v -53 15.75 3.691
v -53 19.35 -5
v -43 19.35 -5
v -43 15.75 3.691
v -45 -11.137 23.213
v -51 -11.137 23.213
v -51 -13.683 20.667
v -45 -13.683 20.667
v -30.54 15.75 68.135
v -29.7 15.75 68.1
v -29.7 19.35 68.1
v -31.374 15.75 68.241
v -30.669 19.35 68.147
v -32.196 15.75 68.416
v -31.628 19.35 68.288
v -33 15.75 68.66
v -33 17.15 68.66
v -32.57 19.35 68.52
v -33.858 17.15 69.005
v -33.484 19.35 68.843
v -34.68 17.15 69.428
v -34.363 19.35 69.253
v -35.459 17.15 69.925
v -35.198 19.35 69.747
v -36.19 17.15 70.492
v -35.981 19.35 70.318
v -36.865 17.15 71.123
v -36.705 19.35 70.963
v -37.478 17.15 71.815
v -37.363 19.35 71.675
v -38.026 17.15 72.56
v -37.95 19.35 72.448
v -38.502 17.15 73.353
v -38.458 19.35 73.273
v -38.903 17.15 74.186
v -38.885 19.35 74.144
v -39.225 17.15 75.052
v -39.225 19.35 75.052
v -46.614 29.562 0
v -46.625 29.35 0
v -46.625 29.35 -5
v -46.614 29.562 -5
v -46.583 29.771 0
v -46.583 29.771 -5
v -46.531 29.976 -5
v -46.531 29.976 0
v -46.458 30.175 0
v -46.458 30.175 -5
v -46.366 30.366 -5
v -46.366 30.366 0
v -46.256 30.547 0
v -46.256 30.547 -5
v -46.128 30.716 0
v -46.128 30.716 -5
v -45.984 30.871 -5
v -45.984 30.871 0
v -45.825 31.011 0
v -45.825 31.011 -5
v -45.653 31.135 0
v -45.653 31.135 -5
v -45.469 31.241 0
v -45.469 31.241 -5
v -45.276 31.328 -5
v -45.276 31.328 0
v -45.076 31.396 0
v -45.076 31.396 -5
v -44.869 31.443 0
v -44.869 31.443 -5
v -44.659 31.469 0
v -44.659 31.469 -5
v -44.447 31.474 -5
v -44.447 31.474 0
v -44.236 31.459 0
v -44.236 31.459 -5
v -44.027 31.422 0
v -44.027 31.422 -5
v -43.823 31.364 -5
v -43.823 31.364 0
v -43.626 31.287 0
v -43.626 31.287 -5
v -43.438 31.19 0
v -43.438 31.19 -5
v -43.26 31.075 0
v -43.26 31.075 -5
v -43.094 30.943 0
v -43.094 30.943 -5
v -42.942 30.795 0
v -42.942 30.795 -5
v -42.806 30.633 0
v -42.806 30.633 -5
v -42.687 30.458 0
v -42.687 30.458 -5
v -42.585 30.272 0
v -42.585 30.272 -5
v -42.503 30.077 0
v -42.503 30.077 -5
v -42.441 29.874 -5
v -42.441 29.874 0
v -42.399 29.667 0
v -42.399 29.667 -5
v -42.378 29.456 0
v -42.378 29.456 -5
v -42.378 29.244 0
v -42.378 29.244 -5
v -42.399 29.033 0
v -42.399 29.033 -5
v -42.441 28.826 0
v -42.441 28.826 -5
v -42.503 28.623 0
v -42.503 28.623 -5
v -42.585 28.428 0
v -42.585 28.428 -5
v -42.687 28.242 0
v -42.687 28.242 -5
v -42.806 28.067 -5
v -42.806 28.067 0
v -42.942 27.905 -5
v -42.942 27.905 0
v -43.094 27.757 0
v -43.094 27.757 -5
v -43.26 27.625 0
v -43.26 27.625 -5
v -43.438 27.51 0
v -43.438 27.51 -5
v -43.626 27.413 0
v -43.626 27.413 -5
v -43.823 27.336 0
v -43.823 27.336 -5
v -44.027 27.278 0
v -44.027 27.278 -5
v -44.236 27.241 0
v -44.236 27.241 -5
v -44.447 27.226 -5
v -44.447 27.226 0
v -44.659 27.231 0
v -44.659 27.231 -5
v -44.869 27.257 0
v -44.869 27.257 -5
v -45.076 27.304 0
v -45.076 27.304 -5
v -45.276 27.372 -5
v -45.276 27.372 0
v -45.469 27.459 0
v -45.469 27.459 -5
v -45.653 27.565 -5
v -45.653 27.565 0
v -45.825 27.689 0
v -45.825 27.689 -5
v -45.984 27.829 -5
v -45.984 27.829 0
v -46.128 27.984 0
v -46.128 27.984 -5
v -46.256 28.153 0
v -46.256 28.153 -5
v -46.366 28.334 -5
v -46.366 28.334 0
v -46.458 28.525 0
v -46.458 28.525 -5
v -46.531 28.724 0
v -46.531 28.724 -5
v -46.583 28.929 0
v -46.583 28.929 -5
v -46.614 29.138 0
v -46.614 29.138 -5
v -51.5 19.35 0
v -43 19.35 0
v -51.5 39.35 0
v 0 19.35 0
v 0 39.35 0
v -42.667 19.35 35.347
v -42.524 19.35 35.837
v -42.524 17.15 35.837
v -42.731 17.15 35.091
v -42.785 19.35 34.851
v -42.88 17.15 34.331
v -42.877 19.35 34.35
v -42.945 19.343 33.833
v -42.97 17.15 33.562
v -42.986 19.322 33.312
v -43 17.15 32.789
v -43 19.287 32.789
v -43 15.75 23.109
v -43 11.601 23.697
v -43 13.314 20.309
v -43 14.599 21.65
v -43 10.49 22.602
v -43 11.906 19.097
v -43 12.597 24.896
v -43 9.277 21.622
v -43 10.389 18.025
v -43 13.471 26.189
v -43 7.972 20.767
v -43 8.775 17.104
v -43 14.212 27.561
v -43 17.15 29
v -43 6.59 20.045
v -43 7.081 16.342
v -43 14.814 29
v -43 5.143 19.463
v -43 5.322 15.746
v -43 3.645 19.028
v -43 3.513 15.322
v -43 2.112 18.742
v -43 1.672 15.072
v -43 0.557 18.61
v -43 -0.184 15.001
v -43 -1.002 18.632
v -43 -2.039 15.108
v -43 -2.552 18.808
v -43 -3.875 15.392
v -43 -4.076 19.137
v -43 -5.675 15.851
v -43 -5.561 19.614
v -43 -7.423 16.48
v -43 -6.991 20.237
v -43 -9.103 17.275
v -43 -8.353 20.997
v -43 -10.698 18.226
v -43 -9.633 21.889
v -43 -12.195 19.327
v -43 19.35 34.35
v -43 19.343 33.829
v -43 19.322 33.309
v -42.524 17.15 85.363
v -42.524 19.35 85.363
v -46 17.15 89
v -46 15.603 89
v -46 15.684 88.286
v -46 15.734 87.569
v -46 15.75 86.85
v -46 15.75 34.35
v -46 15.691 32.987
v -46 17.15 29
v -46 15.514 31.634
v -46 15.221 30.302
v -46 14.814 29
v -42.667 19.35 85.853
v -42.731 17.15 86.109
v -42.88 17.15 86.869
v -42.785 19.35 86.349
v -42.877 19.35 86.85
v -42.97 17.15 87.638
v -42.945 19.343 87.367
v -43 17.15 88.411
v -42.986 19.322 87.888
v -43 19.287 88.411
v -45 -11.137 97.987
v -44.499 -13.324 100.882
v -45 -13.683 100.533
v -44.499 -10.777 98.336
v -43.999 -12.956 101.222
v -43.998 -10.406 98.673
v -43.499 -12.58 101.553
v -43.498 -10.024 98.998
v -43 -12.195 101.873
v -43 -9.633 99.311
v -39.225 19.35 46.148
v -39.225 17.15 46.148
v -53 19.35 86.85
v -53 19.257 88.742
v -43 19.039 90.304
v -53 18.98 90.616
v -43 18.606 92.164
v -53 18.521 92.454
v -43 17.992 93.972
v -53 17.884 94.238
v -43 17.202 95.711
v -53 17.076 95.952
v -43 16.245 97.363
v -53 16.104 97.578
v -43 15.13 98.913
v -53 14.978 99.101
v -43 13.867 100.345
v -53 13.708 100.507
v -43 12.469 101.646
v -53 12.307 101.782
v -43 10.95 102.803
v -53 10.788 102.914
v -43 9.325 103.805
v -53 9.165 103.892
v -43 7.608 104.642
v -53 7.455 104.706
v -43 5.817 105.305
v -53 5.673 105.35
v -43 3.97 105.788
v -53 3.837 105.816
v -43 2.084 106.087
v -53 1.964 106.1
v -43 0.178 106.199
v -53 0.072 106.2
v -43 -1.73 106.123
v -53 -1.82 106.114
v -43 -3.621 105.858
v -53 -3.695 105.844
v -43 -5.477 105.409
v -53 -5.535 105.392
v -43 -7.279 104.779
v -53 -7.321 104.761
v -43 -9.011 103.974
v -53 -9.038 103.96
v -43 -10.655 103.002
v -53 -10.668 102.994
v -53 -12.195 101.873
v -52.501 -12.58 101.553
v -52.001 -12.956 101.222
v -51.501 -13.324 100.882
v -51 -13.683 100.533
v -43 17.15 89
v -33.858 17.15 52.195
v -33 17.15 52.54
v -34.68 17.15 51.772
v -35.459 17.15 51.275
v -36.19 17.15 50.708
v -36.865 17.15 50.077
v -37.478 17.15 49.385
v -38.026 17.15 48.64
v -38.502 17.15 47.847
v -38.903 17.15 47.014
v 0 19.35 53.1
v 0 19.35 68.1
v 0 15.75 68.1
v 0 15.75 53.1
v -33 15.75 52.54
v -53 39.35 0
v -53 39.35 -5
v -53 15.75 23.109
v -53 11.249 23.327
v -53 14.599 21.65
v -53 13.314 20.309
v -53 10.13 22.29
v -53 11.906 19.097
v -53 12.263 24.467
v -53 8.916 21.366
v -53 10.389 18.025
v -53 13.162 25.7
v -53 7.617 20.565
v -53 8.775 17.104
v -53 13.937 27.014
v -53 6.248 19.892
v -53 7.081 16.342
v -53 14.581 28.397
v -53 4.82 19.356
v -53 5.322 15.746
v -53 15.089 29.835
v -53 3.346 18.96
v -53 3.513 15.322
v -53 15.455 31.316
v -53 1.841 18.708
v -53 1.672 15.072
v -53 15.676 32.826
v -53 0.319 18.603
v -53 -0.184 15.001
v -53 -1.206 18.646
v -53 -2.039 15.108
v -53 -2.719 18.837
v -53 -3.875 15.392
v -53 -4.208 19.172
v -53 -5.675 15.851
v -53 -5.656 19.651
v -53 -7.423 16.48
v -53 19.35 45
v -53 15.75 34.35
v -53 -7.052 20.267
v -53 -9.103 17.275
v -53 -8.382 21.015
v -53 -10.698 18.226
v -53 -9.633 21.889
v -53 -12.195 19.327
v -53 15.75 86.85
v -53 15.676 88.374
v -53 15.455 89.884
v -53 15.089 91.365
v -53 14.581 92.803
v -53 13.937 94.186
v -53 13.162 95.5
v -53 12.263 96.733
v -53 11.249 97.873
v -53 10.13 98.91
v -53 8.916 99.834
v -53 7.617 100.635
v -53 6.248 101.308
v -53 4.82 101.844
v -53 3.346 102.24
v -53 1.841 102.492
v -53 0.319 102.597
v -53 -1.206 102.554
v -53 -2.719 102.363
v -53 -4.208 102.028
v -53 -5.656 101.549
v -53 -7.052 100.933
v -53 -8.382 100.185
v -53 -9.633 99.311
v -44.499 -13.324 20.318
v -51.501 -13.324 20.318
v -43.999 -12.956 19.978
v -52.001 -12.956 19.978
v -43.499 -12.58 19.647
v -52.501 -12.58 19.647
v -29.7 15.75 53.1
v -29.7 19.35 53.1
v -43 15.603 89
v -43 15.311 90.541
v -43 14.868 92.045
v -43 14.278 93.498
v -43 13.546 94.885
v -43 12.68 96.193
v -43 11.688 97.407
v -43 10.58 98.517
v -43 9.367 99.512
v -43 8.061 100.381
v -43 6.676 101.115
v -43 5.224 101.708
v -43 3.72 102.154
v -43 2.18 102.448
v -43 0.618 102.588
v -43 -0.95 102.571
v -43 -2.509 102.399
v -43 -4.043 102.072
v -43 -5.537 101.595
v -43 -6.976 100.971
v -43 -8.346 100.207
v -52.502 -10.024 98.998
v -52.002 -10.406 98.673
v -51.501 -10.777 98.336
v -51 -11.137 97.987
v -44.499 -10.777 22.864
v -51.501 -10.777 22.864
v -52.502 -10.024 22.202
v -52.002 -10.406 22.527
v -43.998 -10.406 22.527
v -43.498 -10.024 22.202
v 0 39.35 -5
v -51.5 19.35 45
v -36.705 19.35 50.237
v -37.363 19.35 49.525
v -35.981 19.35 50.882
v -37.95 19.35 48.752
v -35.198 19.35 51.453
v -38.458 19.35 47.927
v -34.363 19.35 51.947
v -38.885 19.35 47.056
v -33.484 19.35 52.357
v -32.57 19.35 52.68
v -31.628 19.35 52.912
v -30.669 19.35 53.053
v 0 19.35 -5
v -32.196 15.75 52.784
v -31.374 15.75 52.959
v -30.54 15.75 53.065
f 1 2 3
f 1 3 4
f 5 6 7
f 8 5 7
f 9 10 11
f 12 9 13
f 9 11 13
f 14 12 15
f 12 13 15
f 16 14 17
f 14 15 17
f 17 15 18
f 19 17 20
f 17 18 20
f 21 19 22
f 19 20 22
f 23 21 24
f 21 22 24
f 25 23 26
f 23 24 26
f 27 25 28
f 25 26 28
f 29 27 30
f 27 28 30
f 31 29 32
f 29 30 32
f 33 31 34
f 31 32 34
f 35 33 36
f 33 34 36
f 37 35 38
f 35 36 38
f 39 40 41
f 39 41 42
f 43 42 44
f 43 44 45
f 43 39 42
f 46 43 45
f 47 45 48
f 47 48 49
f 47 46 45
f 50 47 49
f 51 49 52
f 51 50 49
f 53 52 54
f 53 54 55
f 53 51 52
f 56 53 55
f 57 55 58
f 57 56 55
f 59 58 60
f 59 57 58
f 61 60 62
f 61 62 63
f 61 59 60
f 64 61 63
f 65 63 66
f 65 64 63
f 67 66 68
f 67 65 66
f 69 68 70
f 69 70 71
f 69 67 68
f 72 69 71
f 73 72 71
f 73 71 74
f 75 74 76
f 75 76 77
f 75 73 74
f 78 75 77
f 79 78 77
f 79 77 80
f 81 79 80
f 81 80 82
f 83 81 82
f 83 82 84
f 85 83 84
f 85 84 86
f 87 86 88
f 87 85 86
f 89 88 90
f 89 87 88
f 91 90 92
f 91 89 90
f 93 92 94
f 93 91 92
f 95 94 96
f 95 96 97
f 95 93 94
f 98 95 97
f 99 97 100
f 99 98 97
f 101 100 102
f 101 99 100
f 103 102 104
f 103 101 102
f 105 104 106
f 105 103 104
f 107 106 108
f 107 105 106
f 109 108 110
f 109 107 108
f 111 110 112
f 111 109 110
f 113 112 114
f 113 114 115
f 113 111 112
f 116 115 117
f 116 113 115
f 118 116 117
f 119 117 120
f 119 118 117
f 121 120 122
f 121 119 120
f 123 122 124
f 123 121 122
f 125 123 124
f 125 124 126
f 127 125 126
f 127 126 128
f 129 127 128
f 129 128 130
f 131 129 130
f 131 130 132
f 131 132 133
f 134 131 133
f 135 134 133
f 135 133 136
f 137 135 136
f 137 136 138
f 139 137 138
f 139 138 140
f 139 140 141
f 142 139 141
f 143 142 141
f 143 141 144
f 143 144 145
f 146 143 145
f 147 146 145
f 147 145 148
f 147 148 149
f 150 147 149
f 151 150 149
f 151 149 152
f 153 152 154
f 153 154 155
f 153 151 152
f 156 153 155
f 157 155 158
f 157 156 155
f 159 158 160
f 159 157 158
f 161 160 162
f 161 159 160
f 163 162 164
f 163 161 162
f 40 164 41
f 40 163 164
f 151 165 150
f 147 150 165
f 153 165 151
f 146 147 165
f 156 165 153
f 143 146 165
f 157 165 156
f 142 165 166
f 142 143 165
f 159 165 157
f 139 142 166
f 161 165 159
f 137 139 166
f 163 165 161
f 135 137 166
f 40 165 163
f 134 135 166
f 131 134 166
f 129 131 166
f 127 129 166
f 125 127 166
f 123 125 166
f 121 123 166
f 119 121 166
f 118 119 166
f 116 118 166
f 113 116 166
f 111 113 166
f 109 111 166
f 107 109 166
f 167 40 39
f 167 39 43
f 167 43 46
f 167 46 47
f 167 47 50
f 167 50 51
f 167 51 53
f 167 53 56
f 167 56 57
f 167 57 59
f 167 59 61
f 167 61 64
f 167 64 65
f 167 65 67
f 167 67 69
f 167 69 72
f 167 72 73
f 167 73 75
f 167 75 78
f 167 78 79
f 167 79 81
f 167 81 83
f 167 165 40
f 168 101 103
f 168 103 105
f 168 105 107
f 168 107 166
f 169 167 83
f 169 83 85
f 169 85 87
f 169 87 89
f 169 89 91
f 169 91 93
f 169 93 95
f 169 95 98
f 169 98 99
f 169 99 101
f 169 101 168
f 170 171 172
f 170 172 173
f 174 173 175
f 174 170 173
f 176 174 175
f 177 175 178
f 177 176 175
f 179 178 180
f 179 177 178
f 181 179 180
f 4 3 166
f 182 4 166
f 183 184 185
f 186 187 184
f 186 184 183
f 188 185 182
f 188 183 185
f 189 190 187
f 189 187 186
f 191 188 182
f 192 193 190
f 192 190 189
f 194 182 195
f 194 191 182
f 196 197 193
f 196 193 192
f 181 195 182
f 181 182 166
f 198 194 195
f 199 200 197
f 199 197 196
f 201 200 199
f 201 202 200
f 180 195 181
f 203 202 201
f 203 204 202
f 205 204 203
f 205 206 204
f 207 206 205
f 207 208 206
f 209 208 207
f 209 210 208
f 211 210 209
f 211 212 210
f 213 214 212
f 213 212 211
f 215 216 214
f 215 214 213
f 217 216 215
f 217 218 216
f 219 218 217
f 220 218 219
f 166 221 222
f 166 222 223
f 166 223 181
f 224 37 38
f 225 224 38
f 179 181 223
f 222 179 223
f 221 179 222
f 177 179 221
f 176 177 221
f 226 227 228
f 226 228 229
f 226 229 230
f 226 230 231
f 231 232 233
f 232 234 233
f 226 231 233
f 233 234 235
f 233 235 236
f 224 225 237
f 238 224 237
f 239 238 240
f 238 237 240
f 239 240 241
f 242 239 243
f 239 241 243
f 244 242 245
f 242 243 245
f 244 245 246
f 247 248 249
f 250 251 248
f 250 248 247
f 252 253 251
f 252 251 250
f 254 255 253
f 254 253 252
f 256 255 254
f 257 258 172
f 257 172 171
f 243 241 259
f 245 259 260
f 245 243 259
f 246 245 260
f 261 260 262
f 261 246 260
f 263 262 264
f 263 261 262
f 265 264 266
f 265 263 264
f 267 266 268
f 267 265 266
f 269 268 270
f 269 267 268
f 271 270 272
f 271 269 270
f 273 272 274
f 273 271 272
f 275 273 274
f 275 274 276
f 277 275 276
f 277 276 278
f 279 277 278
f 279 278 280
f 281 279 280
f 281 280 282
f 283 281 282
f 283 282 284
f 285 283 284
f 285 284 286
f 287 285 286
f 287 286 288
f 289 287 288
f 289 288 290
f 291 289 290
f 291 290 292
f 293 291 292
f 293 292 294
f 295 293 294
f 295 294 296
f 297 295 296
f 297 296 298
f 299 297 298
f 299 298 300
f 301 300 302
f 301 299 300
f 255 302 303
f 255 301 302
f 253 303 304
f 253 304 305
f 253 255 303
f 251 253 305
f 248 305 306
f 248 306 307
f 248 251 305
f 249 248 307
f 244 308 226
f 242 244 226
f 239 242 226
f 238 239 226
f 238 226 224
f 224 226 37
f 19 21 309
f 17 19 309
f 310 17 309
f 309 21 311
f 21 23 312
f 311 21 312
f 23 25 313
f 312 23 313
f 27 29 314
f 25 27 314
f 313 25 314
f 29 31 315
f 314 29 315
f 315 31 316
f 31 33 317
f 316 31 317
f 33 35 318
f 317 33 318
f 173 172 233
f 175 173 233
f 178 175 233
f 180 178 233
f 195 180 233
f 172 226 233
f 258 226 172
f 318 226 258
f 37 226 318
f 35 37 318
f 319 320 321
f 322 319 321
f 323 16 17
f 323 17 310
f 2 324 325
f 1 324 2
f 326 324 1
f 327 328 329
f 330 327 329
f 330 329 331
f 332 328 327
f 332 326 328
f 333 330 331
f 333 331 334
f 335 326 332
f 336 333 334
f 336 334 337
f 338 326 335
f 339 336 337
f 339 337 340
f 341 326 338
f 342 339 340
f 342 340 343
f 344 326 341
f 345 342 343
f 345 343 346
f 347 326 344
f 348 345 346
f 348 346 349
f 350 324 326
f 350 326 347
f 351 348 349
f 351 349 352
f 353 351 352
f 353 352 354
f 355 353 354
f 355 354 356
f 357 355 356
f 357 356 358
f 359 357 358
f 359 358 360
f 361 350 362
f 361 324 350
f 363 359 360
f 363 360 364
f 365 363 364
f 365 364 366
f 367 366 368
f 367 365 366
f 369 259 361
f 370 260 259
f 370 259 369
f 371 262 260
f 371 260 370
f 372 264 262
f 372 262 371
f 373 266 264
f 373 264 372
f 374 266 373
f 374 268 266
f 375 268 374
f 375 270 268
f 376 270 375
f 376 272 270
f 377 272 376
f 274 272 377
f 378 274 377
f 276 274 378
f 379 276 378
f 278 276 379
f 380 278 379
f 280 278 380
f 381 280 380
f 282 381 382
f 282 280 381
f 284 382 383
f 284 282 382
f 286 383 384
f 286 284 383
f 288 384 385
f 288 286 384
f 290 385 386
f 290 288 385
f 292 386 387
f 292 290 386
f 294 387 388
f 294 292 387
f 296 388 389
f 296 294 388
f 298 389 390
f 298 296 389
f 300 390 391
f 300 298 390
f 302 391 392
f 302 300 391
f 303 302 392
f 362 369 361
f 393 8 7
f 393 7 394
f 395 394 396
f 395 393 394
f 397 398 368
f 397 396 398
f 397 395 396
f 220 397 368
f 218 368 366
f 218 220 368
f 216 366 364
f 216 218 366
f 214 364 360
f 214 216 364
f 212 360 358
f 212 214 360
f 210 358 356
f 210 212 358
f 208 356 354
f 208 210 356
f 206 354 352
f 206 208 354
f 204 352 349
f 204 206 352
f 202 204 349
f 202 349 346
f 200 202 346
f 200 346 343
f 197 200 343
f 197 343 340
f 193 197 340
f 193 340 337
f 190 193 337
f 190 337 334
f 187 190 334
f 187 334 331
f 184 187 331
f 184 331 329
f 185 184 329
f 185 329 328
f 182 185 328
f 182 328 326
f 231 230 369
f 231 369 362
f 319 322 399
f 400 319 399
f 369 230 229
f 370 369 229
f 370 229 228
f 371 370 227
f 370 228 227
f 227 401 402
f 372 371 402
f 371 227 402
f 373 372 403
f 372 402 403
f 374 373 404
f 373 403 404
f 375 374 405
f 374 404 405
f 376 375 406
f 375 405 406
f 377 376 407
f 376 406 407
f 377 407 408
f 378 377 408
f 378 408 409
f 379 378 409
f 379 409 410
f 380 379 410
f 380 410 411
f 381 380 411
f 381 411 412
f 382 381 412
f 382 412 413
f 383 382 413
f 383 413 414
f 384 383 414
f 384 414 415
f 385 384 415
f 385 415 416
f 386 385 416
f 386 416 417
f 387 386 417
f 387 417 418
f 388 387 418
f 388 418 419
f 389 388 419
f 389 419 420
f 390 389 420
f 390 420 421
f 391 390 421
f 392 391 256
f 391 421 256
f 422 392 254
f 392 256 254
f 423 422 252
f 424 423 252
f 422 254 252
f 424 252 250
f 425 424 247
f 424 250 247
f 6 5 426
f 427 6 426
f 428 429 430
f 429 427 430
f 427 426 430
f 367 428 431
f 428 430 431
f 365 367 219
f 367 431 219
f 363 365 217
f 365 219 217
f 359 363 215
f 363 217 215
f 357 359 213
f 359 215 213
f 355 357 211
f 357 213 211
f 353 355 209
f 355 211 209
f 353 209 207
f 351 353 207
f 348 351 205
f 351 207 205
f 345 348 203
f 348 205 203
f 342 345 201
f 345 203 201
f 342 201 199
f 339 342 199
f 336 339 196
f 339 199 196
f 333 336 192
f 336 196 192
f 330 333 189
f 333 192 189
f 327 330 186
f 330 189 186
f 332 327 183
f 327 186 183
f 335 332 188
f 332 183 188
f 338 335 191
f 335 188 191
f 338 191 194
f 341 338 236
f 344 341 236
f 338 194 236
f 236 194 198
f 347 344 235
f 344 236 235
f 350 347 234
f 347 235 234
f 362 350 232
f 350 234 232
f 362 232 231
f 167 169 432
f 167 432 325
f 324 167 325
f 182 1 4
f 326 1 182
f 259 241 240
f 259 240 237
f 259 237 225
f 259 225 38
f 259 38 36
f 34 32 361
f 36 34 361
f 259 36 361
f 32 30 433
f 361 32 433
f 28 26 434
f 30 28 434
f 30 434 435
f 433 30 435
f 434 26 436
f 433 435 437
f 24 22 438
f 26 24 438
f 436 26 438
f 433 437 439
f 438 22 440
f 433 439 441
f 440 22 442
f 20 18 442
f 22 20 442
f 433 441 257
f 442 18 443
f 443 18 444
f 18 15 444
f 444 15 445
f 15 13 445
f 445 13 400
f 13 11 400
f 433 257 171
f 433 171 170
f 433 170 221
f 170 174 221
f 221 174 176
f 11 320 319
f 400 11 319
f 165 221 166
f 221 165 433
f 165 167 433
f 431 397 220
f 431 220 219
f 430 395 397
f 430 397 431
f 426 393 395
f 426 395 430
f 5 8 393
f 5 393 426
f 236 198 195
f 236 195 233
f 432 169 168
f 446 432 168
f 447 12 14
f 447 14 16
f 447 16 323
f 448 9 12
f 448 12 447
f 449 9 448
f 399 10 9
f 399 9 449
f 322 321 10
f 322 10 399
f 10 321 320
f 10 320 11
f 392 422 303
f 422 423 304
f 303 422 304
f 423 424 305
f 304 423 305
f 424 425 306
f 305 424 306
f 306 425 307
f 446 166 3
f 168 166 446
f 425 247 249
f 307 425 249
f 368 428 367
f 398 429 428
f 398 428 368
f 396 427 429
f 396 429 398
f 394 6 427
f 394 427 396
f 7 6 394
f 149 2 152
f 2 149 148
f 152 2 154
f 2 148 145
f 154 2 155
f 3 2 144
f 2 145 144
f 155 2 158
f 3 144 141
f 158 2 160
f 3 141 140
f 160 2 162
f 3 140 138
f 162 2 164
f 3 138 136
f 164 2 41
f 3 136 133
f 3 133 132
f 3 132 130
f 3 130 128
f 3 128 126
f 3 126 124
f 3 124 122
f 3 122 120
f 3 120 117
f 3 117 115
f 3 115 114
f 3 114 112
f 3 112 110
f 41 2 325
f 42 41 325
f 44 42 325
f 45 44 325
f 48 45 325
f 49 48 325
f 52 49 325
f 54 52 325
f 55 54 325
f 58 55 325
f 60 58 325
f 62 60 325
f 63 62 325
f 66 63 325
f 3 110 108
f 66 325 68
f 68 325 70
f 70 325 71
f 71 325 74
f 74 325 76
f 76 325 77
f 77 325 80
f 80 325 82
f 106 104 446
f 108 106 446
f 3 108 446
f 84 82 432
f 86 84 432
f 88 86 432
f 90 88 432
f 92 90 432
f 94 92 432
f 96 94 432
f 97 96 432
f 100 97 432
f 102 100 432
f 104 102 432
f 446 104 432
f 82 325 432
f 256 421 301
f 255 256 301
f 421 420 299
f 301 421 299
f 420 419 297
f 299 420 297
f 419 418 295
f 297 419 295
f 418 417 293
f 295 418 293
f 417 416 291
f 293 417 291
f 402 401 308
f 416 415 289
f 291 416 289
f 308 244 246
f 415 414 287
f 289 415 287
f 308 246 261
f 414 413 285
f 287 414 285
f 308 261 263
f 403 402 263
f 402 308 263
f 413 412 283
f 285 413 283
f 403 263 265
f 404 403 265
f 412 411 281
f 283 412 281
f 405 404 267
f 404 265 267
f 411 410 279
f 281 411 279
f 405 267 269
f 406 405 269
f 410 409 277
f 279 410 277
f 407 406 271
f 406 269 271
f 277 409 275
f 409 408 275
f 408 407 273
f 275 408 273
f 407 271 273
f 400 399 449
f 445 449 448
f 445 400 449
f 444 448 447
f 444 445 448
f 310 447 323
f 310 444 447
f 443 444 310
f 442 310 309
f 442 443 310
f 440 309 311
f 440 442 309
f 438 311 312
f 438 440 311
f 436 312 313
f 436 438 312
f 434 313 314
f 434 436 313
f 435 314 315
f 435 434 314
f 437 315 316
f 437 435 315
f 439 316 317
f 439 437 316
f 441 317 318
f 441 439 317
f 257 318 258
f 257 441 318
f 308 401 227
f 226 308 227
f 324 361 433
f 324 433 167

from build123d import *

# Parameters (mm, degrees)
SKETCH004_R       = 2.125
PAD001_DEPTH      = 5
PAD002_DEPTH      = 1.5
PAD003_DEPTH      = 8.5
PAD_DEPTH         = 53
SKETCH001_W       = 43
SKETCH001_H       = 38.1
POCKET_DEPTH      = 19.351
POCKET_DEPTH_BACK = 13.683516
CHAMFER_1_SIZE2   = 6
CHAMFER_1_SIZE    = 18.75
CHAMFER_2_SIZE2   = 6
CHAMFER_2_SIZE    = 18.75
FILLET_R          = 10
SKETCH002_W       = 60
SKETCH002_H       = 13
POCKET001_DEPTH   = 1.4
CHAMFER001_SIZE   = 2


with BuildPart() as body001:
    # Sketch004 → Pad001 (new body)
    with BuildSketch(Plane.XY):
        Polygon((0, 0), (0, 10), (53, 10), (53, -10), (0, -10), align=None)
        with Locations((44.5, 0)):
            Circle(SKETCH004_R, mode=Mode.SUBTRACT)
    extrude(amount=-PAD001_DEPTH)

    # Sketch005 (on Face3 of Pad001) → Pad002 (join)
    with BuildSketch(Plane.YZ.offset(53)):
        Polygon((-10, 45), (10, 0), (-10, 0), (-10, -5), (-13.6, 3.691169), (-13.6, 45), align=None)
    extrude(amount=-PAD002_DEPTH)

    # Sketch006 (on Face9 of Pad002) → Pad003 (join)
    with BuildSketch(Plane(origin=(51.5, 0, 0), x_dir=(0, -1, 0), z_dir=(-1, 0, 0))):
        Polygon((10, 35), (10, -5), (13.6, 3.691169), (13.6, 29), (11, 29), (11, 35), align=None)
    extrude(amount=PAD003_DEPTH)


with BuildPart() as body001_1:
    # Body001 placement: moved
    add(body001.part.moved(Location((0, 29.35, 0))))


with BuildPart() as body002:
    # Sketch → Pad (new body)
    with BuildSketch(Plane.YZ):
        with BuildLine():
            ThreePointArc((15.75, 71.85), (6.027264, 86.401103), (-11.136932, 82.986932))
            Line((-11.136932, 82.986932), (-13.682516, 85.532516))
            ThreePointArc((19.35, 71.85), (7.404924, 89.727069), (-13.682516, 85.532516))
            Line((19.35, 71.85), (19.35, 19.35))
            ThreePointArc((-13.682516, 5.667484), (7.404924, 1.472931), (19.35, 19.35))
            Line((-11.136932, 8.213068), (-13.682516, 5.667484))
            ThreePointArc((-11.136932, 8.213068), (6.027264, 4.798897), (15.75, 19.35))
            Line((15.75, 71.85), (15.75, 19.35))
        make_face()
    extrude(amount=PAD_DEPTH)

    # Sketch001 → Pocket (cut, two sides)
    with BuildSketch(Plane.XZ) as pocket_sk:
        with Locations((21.5, 19.05)):
            Rectangle(SKETCH001_W, SKETCH001_H)
        with Locations((21.5, 72.15)):
            Rectangle(SKETCH001_W, SKETCH001_H)
    extrude(amount=-POCKET_DEPTH, mode=Mode.SUBTRACT)
    extrude(pocket_sk.sketch, amount=POCKET_DEPTH_BACK, mode=Mode.SUBTRACT)

    # Chamfer 1
    chamfer_1_edges = [body002.edges().sort_by_distance(p)[0] for p in [
        (43, 17.55, 53.1),
    ]]
    chamfer_1_side = body002.faces().sort_by_distance((43, 16.254258, 62.475))[0]
    chamfer(chamfer_1_edges, length=CHAMFER_1_SIZE, length2=CHAMFER_1_SIZE2, reference=chamfer_1_side)

    # Chamfer 2
    chamfer_2_edges = [body002.edges().sort_by_distance(p)[0] for p in [
        (43, 17.55, 38.1),
    ]]
    chamfer_2_side = body002.faces().sort_by_distance((43, -7.211953, 1.938804))[0]
    chamfer(chamfer_2_edges, length=CHAMFER_2_SIZE, length2=CHAMFER_2_SIZE2, reference=chamfer_2_side)

    # Fillet
    fillet_edges = [body002.edges().sort_by_distance(p)[0] for p in [
        (37, 17.55, 38.1),
        (43, 17.55, 19.35),
        (37, 17.55, 53.1),
        (43, 17.55, 71.85),
    ]]
    fillet(fillet_edges, radius=FILLET_R)

    # Sketch002 → Pocket001 (cut, symmetric)
    with BuildSketch(Plane(origin=(0, 15.75, 0), x_dir=(0, 0, -1), z_dir=(0, -1, 0))):
        with Locations((-44, 39.5)):
            Rectangle(SKETCH002_W, SKETCH002_H)
    extrude(amount=POCKET001_DEPTH, both=True, mode=Mode.SUBTRACT)

    # Chamfer001
    chamfer001_edges = [body002.edges().sort_by_distance(p)[0] for p in [
        (43, -12.409724, 6.940276),
        (53, -12.409724, 6.940276),
        (43, -12.409724, 84.259724),
        (53, -12.409724, 84.259724),
    ]]
    chamfer(chamfer001_edges, length=CHAMFER001_SIZE)


with BuildPart() as body002_1:
    # Body placement: moved
    add(body002.part.moved(Location((0, 0, 15))))

    # Connect: union Body001
    add(body001_1.part)


with BuildPart() as part_mirroring:
    # Part__Mirroring: instance of Body002
    add(body002_1.part.mirror(Plane(origin=(0, 0, 0), x_dir=(0, -1, 0), z_dir=(1, 0, 0))))


solid = part_mirroring.part
